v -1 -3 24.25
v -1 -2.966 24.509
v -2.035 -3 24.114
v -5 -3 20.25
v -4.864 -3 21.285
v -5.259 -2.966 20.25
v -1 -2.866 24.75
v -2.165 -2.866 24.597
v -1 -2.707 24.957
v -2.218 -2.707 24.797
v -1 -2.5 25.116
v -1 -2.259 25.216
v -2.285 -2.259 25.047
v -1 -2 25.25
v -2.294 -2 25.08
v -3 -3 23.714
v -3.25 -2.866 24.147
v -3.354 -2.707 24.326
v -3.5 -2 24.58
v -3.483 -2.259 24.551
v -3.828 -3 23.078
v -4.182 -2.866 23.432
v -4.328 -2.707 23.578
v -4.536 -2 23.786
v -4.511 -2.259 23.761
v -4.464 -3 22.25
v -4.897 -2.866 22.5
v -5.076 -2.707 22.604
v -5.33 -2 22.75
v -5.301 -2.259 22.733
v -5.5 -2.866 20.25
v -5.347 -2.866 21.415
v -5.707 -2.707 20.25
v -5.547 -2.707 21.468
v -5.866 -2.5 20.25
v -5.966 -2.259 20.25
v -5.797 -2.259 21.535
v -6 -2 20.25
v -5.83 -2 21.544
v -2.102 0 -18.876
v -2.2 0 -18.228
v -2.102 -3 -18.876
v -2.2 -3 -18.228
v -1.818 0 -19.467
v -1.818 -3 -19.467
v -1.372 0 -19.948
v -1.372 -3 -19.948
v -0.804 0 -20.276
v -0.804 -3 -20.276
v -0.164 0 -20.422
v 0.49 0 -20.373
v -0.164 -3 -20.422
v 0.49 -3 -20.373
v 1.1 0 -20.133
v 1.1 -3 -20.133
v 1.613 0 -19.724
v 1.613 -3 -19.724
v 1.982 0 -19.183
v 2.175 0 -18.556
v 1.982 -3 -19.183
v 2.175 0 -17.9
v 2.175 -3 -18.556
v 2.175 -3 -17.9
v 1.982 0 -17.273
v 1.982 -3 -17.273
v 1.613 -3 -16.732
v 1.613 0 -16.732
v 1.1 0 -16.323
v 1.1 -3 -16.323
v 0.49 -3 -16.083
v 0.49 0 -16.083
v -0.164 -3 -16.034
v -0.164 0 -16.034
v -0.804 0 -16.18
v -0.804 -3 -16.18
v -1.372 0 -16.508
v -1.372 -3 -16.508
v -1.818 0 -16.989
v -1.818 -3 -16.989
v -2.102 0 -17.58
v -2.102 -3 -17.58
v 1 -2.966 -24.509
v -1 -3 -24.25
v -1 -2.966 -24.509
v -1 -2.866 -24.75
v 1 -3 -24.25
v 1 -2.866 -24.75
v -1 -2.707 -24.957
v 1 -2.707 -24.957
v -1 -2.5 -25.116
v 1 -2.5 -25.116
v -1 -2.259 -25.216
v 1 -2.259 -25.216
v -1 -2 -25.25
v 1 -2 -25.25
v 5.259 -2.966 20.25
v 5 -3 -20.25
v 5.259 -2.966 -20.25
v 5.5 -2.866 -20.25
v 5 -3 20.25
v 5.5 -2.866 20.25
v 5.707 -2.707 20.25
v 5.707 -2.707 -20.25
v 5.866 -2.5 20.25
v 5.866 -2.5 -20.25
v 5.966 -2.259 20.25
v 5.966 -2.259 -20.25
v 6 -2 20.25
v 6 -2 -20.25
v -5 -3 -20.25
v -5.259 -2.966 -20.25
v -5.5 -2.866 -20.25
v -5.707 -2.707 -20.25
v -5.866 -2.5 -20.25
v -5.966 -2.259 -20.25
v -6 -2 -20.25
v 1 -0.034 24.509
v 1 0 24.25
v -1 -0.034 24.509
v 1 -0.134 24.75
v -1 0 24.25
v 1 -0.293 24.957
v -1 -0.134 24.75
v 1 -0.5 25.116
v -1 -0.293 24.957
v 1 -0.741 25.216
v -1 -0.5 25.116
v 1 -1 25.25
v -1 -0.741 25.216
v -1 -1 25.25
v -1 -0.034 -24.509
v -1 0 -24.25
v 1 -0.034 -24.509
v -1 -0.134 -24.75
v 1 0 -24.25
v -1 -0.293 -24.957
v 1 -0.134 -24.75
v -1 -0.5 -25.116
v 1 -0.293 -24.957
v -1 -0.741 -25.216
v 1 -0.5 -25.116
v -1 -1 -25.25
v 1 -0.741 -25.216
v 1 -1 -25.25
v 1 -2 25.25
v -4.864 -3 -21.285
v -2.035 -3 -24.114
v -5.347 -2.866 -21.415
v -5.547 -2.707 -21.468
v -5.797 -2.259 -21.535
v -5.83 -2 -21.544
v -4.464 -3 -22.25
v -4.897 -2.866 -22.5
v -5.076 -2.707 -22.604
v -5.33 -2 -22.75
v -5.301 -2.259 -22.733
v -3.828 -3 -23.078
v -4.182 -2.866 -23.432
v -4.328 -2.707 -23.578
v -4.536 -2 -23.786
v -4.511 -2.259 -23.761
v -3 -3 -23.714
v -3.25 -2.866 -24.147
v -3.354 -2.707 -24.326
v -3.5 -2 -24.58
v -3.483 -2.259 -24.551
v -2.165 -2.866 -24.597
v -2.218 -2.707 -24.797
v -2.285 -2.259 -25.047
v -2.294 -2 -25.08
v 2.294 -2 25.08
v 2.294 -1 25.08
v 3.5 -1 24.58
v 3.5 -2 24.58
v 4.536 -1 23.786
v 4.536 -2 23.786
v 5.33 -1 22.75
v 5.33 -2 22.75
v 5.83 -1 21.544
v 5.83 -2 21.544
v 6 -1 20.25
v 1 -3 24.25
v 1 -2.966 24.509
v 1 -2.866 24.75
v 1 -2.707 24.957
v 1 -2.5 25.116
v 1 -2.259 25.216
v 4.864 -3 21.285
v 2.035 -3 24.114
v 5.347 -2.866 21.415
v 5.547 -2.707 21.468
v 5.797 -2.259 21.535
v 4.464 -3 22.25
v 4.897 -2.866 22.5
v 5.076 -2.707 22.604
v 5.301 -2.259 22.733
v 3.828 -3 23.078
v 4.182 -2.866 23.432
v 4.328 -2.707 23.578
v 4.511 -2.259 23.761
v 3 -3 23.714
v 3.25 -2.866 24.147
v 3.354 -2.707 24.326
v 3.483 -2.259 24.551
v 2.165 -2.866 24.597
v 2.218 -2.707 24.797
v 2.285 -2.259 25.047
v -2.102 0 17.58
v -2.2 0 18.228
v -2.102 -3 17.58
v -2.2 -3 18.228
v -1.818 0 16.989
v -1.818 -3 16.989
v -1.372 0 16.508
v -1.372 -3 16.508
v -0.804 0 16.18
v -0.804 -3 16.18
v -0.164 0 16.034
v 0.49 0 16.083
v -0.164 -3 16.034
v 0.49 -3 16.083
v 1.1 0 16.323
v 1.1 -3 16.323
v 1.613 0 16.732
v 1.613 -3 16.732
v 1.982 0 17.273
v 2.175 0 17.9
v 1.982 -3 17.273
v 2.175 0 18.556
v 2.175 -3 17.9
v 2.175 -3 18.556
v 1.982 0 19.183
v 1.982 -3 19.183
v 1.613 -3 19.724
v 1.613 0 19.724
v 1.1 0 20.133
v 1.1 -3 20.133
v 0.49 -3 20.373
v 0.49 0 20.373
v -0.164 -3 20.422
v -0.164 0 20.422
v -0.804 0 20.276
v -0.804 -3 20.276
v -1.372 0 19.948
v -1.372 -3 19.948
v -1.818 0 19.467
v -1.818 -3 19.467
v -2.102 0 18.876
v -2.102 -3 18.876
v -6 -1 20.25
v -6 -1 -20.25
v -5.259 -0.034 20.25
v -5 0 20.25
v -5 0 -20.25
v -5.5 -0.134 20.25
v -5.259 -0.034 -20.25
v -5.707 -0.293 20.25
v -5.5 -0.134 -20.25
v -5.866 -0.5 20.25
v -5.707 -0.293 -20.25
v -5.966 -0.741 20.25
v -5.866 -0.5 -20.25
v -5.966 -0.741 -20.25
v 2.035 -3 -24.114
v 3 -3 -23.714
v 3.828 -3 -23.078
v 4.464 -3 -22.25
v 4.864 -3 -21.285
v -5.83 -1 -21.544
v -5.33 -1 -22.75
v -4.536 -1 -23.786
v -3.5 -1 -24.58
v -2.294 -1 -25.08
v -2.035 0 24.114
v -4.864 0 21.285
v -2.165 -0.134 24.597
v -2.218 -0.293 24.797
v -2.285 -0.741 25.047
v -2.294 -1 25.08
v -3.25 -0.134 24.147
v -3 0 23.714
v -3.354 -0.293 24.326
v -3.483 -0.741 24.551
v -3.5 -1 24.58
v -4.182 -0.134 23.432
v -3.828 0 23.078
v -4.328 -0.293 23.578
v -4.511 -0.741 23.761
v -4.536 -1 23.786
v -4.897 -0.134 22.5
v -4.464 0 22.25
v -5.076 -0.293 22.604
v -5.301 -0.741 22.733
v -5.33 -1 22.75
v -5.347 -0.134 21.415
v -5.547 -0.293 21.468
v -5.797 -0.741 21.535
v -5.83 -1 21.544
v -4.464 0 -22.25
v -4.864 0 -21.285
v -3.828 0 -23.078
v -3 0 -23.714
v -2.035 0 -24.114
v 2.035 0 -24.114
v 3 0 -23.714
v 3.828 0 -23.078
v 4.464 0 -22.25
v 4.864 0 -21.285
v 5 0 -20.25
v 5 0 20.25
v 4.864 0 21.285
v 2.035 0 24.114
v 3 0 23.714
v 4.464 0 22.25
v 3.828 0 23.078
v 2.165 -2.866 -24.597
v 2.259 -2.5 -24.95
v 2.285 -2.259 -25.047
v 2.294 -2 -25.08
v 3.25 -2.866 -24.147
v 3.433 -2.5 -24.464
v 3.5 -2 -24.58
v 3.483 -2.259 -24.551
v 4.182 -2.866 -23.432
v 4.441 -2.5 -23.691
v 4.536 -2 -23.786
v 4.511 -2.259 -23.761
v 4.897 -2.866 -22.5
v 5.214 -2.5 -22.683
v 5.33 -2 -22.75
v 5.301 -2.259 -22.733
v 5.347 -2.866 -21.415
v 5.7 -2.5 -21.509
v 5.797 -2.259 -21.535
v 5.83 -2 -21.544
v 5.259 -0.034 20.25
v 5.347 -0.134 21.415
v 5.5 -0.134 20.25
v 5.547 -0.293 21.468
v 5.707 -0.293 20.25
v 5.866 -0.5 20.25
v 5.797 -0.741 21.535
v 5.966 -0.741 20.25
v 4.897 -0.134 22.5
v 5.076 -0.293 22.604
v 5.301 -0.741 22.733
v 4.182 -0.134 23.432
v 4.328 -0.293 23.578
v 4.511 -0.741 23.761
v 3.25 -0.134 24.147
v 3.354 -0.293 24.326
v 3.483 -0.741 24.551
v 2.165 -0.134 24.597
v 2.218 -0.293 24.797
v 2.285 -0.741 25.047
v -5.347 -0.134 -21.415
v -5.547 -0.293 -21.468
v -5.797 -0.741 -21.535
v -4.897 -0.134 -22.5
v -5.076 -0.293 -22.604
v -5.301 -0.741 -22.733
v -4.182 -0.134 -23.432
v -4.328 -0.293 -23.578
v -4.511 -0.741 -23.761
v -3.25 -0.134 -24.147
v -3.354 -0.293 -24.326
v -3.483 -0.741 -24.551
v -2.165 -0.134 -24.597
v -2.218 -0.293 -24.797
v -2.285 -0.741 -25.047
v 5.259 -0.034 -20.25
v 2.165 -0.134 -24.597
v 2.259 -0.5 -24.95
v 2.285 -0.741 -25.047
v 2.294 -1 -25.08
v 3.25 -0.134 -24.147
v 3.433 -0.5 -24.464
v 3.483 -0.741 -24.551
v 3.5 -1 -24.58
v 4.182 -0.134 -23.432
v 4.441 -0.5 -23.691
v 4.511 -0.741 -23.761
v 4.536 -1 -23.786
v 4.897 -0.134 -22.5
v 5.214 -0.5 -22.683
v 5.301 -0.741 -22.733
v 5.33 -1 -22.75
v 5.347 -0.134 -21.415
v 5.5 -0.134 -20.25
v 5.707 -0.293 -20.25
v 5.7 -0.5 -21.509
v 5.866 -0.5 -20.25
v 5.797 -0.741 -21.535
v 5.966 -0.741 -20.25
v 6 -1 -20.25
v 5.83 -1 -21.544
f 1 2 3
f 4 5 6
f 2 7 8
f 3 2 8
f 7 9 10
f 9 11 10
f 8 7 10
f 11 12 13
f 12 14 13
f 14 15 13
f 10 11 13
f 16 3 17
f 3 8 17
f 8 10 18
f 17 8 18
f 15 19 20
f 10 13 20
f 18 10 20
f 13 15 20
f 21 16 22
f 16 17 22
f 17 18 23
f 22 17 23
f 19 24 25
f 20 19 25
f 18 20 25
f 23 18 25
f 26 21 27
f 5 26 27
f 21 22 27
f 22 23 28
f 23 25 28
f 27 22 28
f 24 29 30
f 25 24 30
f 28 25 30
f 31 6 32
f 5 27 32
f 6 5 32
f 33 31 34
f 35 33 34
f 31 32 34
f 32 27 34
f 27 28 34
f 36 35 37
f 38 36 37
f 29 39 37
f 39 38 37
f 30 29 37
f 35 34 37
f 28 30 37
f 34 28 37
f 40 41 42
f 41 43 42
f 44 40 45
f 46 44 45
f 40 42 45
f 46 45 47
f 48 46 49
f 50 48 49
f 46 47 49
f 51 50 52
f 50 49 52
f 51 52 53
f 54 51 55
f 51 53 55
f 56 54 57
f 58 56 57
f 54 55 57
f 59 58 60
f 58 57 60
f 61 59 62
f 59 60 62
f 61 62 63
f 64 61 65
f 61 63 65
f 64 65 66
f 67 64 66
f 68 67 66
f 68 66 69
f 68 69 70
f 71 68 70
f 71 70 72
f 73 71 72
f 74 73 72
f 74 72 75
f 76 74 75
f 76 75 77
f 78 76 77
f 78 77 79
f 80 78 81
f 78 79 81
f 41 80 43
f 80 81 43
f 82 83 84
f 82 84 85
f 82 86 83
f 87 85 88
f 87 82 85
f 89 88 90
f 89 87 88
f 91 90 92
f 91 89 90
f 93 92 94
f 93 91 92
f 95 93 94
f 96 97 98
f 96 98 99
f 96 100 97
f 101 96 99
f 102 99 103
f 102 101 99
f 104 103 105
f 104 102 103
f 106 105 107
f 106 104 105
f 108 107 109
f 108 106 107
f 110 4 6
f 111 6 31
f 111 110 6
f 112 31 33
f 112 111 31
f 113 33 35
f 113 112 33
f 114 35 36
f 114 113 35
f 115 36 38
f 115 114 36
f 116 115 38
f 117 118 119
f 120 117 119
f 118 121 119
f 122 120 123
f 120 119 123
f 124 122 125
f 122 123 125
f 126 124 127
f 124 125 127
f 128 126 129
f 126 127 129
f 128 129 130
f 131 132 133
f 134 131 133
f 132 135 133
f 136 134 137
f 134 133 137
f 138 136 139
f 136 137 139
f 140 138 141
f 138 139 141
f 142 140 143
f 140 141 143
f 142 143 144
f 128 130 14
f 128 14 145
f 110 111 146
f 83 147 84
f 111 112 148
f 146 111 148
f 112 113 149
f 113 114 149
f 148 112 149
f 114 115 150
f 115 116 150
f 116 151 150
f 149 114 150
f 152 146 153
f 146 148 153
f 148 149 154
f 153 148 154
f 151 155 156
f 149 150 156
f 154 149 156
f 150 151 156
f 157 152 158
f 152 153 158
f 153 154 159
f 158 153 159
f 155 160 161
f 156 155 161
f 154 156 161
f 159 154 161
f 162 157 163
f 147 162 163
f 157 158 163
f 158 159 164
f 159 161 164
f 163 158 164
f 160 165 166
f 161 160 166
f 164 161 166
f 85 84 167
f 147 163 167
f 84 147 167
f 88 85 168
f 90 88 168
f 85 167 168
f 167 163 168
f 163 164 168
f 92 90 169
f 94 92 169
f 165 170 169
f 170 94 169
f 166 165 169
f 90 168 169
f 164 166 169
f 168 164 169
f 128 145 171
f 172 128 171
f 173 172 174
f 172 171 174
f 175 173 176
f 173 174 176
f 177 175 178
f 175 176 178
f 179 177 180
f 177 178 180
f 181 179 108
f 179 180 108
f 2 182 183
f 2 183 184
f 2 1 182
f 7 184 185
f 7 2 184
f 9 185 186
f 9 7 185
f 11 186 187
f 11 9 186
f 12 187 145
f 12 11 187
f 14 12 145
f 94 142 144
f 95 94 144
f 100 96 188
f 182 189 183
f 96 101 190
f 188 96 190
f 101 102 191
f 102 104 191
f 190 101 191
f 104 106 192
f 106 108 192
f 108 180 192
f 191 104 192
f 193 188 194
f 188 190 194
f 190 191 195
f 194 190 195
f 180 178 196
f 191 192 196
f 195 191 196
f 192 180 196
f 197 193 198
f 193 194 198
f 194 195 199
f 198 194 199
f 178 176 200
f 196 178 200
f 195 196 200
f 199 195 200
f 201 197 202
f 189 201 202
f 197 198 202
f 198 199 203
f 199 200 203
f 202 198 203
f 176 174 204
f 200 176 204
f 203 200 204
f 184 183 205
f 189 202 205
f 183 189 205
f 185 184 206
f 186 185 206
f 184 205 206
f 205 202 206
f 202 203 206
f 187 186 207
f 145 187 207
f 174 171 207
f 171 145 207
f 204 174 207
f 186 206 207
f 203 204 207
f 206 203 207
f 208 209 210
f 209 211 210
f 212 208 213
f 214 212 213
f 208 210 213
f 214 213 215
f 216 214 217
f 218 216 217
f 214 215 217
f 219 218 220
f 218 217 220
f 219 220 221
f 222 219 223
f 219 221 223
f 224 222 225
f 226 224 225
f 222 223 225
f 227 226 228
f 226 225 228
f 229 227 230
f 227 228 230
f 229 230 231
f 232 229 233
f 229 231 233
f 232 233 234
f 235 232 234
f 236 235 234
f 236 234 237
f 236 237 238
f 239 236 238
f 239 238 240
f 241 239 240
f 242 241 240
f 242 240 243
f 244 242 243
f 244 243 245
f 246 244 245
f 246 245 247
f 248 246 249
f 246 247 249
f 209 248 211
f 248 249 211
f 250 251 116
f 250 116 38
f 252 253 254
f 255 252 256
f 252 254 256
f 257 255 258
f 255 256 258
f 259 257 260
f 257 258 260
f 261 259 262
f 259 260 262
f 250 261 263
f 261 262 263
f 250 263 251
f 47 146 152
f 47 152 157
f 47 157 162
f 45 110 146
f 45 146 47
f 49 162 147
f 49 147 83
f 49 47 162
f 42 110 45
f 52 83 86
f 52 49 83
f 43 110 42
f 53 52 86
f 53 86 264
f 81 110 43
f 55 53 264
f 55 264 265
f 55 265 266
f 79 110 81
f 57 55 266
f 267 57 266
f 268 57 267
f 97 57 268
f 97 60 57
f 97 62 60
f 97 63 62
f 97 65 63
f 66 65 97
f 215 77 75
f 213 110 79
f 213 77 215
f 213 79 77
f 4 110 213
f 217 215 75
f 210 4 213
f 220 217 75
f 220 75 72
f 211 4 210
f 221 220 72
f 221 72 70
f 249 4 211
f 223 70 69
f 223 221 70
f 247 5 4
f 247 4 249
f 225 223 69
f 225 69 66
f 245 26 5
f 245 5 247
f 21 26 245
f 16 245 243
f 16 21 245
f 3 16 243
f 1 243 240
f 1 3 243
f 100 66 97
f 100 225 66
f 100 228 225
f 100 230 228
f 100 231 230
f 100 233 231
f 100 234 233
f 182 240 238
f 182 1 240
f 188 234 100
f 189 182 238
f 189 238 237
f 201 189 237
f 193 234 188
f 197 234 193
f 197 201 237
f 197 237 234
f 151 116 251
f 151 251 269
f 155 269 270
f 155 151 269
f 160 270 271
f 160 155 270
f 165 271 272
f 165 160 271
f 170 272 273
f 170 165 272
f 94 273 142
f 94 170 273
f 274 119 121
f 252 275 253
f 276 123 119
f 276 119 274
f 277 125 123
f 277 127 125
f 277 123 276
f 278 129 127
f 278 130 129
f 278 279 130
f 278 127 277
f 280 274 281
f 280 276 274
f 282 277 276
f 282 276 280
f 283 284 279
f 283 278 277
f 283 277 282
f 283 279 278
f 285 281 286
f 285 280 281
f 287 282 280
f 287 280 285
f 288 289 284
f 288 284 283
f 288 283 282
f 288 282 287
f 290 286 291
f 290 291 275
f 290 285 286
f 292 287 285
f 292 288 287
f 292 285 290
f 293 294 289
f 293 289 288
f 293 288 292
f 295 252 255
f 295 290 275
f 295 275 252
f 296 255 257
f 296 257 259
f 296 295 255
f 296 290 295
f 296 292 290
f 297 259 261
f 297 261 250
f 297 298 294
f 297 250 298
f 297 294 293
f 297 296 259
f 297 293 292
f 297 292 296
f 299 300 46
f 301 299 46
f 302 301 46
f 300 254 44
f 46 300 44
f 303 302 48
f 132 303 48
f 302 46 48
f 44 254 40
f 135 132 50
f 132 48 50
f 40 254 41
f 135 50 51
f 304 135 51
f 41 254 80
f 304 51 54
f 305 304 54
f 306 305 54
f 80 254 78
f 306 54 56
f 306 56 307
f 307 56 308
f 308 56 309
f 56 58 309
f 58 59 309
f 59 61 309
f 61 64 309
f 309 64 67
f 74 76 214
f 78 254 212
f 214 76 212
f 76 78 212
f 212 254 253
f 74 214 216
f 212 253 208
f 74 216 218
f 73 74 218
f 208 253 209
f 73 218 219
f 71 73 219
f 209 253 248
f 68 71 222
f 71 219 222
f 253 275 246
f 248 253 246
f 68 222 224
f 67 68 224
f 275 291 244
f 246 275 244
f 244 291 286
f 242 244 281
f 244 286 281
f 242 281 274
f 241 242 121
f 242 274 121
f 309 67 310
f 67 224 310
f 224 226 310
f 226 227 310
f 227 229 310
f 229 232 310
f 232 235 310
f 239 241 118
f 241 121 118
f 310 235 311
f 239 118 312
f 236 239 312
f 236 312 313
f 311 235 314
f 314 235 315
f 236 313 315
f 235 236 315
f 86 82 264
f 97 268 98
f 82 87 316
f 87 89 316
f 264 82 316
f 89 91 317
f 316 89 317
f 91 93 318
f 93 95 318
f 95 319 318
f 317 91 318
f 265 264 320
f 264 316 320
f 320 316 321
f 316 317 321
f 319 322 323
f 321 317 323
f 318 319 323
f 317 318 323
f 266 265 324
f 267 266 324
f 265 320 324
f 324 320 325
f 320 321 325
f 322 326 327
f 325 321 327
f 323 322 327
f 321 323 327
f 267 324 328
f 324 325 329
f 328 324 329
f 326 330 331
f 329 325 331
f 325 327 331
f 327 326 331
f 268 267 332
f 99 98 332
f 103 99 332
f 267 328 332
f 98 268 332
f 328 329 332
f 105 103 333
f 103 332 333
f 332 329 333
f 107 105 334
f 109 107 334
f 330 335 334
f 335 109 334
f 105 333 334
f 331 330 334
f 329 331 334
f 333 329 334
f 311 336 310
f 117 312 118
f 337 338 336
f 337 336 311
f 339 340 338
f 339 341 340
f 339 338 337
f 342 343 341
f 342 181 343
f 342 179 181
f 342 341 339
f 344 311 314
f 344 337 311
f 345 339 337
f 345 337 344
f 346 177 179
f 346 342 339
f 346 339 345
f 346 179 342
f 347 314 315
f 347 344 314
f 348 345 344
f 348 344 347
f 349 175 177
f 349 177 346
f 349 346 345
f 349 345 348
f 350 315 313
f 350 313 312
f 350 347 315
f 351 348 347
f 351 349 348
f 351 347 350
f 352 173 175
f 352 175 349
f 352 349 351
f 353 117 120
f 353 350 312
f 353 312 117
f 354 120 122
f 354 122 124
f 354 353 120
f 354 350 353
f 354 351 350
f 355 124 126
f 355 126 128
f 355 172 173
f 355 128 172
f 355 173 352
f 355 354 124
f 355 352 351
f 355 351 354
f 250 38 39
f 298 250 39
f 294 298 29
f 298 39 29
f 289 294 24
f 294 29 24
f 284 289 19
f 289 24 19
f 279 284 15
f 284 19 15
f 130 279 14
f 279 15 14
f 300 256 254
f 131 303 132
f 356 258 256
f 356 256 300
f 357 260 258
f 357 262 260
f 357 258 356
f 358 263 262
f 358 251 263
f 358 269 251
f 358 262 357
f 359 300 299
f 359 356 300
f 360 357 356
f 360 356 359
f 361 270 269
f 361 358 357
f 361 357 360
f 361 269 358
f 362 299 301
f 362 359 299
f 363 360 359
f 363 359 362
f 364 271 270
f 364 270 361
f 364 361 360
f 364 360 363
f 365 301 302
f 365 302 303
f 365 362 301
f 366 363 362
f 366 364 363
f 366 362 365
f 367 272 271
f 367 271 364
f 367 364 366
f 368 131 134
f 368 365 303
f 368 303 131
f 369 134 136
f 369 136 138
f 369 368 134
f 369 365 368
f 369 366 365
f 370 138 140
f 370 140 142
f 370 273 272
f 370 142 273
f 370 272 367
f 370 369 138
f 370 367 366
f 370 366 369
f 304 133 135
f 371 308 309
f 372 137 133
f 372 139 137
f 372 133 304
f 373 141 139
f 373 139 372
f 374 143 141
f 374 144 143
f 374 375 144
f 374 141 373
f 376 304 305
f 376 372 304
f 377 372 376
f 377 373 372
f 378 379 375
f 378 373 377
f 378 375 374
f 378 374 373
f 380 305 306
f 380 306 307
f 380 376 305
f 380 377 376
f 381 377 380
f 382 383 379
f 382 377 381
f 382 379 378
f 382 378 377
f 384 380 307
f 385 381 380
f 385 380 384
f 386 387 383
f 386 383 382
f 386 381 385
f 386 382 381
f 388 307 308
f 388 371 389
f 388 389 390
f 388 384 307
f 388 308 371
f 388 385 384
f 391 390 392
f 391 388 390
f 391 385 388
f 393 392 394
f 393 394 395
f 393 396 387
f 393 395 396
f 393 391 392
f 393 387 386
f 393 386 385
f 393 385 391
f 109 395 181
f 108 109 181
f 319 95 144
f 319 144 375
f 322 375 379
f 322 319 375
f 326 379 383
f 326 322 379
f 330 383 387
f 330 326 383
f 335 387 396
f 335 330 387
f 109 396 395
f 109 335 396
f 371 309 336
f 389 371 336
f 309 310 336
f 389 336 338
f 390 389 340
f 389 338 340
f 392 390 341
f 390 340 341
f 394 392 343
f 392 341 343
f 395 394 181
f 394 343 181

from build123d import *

# Parameters (mm, degrees)
F0_W           = 12
F0_H           = 50.5
F1_DEPTH       = 3
F4_D           = 4.4
F4_DEPTH       = 70
F4_CBORE_D     = 8.25
F4_CBORE_DEPTH = 4
F5_R           = 5
F6_R           = 1


with BuildPart() as f1:
    # F0 (on Front) → F1 (new body)
    with BuildSketch(Plane.XZ):
        Rectangle(F0_W, F0_H)
    extrude(amount=F1_DEPTH)

    # F4
    with Locations(Plane(origin=(0, 8, 0), x_dir=(1, 0, 0), z_dir=(0, 1, 0))):
        with Locations((0, 18.228), (0, -18.228)):
            CounterBoreHole(F4_D / 2, F4_CBORE_D / 2, F4_CBORE_DEPTH, depth=F4_DEPTH)

    # F5
    f5_edges = [f1.edges().sort_by_distance(p)[0] for p in [
        (-6, -1.5, 25.25),
        (6, -1.5, 25.25),
        (-6, -1.5, -25.25),
        (6, -1.5, -25.25),
    ]]
    fillet(f5_edges, radius=F5_R)

    # F6
    f6_edges = [f1.edges().sort_by_distance(p)[0] for p in [
        (6, 0, 0),
        (6, -3, 0),
    ]]
    fillet(f6_edges, radius=F6_R)


solid = f1.part
